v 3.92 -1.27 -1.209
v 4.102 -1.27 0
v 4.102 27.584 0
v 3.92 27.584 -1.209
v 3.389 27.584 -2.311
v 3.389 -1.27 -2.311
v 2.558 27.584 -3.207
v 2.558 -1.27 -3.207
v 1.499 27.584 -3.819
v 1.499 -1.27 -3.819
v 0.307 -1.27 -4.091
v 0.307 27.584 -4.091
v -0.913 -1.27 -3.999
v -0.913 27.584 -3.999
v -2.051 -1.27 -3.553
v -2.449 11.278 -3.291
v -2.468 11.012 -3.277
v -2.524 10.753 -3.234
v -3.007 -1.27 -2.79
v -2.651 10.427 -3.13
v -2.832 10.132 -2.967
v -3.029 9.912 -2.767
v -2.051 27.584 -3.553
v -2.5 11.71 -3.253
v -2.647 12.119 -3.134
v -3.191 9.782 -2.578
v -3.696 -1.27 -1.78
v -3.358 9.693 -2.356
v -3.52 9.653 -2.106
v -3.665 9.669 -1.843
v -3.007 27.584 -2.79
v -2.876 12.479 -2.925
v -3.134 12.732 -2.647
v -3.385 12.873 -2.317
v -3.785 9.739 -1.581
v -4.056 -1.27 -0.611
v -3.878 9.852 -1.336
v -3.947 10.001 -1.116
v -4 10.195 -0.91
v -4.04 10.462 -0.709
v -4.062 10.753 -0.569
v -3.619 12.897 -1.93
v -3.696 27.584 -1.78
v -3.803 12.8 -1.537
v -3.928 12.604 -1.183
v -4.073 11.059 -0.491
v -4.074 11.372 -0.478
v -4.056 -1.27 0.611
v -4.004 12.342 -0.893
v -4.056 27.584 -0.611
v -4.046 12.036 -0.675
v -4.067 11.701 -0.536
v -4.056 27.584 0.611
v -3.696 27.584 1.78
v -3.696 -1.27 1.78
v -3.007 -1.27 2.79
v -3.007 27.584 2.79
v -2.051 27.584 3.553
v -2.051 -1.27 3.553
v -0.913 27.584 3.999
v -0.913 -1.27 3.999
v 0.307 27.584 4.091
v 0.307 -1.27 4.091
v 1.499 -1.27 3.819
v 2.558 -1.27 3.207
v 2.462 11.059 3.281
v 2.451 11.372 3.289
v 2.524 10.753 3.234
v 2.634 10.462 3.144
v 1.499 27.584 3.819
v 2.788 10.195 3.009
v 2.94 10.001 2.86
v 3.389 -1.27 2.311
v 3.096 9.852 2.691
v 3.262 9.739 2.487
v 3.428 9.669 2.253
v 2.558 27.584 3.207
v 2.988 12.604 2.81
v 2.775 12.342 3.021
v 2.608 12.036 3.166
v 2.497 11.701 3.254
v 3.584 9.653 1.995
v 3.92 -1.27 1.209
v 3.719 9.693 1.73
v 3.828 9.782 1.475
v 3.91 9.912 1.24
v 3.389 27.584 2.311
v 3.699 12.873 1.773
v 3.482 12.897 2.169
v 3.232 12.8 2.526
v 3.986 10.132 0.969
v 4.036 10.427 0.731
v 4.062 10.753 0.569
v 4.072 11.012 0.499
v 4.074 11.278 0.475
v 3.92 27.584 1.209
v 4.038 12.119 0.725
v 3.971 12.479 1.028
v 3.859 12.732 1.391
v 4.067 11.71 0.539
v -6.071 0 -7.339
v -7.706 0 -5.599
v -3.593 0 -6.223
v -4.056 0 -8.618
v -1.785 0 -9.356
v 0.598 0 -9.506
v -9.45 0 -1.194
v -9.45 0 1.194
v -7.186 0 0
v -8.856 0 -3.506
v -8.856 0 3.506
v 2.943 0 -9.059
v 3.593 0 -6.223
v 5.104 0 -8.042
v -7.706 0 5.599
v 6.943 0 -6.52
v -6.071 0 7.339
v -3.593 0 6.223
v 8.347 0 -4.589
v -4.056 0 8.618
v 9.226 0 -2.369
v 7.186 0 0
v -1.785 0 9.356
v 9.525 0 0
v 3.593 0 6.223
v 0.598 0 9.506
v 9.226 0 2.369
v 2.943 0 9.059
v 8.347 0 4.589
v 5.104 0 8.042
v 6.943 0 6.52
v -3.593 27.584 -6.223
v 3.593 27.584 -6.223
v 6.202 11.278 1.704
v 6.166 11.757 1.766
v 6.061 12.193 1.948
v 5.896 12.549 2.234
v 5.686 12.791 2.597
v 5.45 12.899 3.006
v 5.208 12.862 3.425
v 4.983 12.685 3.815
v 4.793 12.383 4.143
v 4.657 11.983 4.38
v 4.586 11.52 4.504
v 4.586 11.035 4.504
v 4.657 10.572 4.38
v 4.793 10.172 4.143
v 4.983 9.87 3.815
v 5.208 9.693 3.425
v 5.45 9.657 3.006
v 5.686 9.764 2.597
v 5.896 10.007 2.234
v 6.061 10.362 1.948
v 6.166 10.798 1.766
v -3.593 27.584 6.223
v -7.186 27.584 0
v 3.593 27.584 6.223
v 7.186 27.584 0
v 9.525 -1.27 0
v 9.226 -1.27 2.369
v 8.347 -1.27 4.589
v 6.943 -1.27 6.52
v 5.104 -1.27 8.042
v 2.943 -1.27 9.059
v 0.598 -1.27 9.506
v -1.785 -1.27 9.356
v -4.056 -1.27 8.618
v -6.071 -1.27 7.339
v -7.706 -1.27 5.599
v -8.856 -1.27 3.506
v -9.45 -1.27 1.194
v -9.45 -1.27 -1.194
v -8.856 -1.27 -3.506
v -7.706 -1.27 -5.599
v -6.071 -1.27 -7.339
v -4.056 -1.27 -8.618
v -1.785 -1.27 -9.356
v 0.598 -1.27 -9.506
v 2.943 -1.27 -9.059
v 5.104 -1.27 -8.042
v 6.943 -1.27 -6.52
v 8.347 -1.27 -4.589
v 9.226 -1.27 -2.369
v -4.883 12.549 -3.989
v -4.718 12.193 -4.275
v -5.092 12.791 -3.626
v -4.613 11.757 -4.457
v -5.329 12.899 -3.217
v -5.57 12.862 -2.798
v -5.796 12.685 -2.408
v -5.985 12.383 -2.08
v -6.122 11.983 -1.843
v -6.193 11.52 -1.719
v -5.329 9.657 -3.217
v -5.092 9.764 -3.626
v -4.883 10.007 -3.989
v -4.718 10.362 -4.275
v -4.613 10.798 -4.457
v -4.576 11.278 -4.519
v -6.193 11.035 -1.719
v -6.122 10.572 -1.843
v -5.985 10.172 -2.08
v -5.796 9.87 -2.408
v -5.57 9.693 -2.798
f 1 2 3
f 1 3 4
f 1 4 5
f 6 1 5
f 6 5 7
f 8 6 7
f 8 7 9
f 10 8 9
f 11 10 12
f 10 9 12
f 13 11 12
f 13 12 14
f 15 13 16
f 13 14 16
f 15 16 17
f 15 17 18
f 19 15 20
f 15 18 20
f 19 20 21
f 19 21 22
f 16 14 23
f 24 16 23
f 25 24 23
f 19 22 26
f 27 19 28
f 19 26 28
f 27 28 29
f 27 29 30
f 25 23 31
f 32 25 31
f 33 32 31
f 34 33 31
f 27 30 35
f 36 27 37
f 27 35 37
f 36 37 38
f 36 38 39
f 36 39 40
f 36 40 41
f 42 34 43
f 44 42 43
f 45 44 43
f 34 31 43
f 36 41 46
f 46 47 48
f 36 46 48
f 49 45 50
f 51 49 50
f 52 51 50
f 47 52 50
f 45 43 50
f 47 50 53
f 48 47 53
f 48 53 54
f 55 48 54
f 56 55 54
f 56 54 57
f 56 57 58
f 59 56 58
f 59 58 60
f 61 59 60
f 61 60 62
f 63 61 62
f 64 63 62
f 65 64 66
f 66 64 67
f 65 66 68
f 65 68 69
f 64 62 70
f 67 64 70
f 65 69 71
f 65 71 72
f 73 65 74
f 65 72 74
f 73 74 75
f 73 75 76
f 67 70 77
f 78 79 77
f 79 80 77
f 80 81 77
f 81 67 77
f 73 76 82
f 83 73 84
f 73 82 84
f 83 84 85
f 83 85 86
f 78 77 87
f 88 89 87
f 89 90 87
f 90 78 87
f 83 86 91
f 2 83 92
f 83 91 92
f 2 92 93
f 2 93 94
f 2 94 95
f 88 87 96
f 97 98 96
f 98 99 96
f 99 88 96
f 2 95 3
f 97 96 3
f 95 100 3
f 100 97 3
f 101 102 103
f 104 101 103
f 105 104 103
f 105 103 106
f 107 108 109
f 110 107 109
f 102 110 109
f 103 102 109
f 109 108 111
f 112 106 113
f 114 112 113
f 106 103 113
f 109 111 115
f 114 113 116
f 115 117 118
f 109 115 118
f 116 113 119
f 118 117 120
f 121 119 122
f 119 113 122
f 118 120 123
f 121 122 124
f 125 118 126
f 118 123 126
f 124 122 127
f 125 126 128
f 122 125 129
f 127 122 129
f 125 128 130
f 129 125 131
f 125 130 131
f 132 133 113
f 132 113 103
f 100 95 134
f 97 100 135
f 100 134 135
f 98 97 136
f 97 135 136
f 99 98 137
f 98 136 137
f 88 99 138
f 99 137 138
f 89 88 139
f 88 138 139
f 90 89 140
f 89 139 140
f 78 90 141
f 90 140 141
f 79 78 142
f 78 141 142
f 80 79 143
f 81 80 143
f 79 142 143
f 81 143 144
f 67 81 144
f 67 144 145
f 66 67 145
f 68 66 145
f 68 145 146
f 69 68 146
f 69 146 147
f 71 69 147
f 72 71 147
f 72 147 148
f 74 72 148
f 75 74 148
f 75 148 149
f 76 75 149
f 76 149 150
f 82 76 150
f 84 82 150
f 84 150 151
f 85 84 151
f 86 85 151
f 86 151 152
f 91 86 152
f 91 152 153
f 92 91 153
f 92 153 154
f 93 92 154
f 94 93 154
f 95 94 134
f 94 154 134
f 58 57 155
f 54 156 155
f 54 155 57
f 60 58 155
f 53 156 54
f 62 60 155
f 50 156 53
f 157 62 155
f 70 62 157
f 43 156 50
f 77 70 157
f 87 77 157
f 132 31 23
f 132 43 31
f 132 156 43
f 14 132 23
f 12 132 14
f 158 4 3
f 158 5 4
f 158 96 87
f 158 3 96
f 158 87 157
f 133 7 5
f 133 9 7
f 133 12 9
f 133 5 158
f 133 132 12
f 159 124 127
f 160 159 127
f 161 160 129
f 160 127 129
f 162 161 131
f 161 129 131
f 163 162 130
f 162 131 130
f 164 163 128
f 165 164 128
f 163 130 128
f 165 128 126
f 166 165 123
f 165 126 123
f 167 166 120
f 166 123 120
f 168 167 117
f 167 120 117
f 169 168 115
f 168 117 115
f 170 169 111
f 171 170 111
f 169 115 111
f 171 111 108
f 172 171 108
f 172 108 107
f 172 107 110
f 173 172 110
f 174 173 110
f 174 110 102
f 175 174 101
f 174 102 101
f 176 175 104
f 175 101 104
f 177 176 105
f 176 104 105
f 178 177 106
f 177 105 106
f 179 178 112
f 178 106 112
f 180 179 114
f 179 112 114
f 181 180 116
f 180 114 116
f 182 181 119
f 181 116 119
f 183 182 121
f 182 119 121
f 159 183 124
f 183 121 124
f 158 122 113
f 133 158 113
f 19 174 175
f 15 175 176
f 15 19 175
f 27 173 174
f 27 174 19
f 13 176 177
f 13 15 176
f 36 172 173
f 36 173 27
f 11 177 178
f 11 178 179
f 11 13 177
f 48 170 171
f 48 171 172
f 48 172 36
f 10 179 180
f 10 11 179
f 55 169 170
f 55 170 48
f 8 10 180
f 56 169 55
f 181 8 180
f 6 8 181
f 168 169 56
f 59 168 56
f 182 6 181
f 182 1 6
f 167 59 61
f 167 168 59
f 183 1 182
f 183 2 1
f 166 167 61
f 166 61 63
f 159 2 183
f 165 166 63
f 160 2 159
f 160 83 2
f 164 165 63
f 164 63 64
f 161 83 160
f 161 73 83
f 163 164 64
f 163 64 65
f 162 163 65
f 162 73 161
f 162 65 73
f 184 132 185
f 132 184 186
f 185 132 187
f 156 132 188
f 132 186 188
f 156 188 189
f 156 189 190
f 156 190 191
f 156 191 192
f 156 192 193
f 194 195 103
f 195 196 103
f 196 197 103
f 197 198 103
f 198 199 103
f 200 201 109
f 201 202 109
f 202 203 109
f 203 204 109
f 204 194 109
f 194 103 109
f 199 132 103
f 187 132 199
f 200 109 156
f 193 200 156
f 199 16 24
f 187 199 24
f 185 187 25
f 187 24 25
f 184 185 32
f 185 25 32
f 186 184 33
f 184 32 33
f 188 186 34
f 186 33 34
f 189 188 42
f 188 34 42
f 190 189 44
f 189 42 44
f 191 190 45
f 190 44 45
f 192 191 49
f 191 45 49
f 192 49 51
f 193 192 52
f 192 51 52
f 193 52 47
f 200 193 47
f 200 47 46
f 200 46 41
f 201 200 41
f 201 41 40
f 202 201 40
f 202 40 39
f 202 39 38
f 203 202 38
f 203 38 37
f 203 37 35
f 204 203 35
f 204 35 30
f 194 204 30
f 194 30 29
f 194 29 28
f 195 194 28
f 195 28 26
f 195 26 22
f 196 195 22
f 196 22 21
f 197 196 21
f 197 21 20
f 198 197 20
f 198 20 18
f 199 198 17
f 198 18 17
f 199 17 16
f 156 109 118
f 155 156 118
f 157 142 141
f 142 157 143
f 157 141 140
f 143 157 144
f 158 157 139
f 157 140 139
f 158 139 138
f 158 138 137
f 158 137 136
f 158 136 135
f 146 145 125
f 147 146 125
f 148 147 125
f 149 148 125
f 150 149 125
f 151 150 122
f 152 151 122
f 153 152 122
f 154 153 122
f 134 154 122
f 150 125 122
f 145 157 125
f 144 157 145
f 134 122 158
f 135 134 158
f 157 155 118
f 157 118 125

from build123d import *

# Parameters (mm, degrees)
BOSS_EXTRUDE1_DEPTH = 27.5844
SKETCH3_R           = 1.6256
CUT_EXTRUDE2_DEPTH  = 16.5575
SKETCH4_R           = 9.525
BOSS_EXTRUDE3_DEPTH = 1.27
SKETCH2_R           = 4.1021
CUT_EXTRUDE1_DEPTH  = 29.8544


with BuildPart() as part:
    # Sketch1 → Boss-Extrude1 (new body)
    with BuildSketch(Plane(origin=(0, 0, 0), x_dir=(1, 0, 0), z_dir=(0, 1, 0))):
        Polygon((-3.592850725, 6.223), (-7.18570145, 0), (-3.592850725, -6.223), (3.592850725, -6.223), (7.18570145, 0), (3.592850725, 6.223), align=None)
    extrude(amount=BOSS_EXTRUDE1_DEPTH)

    # Sketch3 → Cut-Extrude2 (cut, through all)
    with BuildSketch(Plane(origin=(5.389276088, 0, 3.1115), x_dir=(0.5, 0, -0.866025404), z_dir=(0.866025404, 0, 0.5))):
        with Locations((0, 11.2776)):
            Circle(SKETCH3_R)
    extrude(amount=-CUT_EXTRUDE2_DEPTH, mode=Mode.SUBTRACT)

    # Sketch4 → Boss-Extrude3 (add)
    with BuildSketch(Plane.XZ):
        Circle(SKETCH4_R)
    extrude(amount=BOSS_EXTRUDE3_DEPTH)

    # Sketch2 → Cut-Extrude1 (cut, through all)
    with BuildSketch(Plane(origin=(0, 27.5844, 0), x_dir=(1, 0, 0), z_dir=(0, 1, 0))):
        Circle(SKETCH2_R)
    extrude(amount=-CUT_EXTRUDE1_DEPTH, mode=Mode.SUBTRACT)


solid = part.part
